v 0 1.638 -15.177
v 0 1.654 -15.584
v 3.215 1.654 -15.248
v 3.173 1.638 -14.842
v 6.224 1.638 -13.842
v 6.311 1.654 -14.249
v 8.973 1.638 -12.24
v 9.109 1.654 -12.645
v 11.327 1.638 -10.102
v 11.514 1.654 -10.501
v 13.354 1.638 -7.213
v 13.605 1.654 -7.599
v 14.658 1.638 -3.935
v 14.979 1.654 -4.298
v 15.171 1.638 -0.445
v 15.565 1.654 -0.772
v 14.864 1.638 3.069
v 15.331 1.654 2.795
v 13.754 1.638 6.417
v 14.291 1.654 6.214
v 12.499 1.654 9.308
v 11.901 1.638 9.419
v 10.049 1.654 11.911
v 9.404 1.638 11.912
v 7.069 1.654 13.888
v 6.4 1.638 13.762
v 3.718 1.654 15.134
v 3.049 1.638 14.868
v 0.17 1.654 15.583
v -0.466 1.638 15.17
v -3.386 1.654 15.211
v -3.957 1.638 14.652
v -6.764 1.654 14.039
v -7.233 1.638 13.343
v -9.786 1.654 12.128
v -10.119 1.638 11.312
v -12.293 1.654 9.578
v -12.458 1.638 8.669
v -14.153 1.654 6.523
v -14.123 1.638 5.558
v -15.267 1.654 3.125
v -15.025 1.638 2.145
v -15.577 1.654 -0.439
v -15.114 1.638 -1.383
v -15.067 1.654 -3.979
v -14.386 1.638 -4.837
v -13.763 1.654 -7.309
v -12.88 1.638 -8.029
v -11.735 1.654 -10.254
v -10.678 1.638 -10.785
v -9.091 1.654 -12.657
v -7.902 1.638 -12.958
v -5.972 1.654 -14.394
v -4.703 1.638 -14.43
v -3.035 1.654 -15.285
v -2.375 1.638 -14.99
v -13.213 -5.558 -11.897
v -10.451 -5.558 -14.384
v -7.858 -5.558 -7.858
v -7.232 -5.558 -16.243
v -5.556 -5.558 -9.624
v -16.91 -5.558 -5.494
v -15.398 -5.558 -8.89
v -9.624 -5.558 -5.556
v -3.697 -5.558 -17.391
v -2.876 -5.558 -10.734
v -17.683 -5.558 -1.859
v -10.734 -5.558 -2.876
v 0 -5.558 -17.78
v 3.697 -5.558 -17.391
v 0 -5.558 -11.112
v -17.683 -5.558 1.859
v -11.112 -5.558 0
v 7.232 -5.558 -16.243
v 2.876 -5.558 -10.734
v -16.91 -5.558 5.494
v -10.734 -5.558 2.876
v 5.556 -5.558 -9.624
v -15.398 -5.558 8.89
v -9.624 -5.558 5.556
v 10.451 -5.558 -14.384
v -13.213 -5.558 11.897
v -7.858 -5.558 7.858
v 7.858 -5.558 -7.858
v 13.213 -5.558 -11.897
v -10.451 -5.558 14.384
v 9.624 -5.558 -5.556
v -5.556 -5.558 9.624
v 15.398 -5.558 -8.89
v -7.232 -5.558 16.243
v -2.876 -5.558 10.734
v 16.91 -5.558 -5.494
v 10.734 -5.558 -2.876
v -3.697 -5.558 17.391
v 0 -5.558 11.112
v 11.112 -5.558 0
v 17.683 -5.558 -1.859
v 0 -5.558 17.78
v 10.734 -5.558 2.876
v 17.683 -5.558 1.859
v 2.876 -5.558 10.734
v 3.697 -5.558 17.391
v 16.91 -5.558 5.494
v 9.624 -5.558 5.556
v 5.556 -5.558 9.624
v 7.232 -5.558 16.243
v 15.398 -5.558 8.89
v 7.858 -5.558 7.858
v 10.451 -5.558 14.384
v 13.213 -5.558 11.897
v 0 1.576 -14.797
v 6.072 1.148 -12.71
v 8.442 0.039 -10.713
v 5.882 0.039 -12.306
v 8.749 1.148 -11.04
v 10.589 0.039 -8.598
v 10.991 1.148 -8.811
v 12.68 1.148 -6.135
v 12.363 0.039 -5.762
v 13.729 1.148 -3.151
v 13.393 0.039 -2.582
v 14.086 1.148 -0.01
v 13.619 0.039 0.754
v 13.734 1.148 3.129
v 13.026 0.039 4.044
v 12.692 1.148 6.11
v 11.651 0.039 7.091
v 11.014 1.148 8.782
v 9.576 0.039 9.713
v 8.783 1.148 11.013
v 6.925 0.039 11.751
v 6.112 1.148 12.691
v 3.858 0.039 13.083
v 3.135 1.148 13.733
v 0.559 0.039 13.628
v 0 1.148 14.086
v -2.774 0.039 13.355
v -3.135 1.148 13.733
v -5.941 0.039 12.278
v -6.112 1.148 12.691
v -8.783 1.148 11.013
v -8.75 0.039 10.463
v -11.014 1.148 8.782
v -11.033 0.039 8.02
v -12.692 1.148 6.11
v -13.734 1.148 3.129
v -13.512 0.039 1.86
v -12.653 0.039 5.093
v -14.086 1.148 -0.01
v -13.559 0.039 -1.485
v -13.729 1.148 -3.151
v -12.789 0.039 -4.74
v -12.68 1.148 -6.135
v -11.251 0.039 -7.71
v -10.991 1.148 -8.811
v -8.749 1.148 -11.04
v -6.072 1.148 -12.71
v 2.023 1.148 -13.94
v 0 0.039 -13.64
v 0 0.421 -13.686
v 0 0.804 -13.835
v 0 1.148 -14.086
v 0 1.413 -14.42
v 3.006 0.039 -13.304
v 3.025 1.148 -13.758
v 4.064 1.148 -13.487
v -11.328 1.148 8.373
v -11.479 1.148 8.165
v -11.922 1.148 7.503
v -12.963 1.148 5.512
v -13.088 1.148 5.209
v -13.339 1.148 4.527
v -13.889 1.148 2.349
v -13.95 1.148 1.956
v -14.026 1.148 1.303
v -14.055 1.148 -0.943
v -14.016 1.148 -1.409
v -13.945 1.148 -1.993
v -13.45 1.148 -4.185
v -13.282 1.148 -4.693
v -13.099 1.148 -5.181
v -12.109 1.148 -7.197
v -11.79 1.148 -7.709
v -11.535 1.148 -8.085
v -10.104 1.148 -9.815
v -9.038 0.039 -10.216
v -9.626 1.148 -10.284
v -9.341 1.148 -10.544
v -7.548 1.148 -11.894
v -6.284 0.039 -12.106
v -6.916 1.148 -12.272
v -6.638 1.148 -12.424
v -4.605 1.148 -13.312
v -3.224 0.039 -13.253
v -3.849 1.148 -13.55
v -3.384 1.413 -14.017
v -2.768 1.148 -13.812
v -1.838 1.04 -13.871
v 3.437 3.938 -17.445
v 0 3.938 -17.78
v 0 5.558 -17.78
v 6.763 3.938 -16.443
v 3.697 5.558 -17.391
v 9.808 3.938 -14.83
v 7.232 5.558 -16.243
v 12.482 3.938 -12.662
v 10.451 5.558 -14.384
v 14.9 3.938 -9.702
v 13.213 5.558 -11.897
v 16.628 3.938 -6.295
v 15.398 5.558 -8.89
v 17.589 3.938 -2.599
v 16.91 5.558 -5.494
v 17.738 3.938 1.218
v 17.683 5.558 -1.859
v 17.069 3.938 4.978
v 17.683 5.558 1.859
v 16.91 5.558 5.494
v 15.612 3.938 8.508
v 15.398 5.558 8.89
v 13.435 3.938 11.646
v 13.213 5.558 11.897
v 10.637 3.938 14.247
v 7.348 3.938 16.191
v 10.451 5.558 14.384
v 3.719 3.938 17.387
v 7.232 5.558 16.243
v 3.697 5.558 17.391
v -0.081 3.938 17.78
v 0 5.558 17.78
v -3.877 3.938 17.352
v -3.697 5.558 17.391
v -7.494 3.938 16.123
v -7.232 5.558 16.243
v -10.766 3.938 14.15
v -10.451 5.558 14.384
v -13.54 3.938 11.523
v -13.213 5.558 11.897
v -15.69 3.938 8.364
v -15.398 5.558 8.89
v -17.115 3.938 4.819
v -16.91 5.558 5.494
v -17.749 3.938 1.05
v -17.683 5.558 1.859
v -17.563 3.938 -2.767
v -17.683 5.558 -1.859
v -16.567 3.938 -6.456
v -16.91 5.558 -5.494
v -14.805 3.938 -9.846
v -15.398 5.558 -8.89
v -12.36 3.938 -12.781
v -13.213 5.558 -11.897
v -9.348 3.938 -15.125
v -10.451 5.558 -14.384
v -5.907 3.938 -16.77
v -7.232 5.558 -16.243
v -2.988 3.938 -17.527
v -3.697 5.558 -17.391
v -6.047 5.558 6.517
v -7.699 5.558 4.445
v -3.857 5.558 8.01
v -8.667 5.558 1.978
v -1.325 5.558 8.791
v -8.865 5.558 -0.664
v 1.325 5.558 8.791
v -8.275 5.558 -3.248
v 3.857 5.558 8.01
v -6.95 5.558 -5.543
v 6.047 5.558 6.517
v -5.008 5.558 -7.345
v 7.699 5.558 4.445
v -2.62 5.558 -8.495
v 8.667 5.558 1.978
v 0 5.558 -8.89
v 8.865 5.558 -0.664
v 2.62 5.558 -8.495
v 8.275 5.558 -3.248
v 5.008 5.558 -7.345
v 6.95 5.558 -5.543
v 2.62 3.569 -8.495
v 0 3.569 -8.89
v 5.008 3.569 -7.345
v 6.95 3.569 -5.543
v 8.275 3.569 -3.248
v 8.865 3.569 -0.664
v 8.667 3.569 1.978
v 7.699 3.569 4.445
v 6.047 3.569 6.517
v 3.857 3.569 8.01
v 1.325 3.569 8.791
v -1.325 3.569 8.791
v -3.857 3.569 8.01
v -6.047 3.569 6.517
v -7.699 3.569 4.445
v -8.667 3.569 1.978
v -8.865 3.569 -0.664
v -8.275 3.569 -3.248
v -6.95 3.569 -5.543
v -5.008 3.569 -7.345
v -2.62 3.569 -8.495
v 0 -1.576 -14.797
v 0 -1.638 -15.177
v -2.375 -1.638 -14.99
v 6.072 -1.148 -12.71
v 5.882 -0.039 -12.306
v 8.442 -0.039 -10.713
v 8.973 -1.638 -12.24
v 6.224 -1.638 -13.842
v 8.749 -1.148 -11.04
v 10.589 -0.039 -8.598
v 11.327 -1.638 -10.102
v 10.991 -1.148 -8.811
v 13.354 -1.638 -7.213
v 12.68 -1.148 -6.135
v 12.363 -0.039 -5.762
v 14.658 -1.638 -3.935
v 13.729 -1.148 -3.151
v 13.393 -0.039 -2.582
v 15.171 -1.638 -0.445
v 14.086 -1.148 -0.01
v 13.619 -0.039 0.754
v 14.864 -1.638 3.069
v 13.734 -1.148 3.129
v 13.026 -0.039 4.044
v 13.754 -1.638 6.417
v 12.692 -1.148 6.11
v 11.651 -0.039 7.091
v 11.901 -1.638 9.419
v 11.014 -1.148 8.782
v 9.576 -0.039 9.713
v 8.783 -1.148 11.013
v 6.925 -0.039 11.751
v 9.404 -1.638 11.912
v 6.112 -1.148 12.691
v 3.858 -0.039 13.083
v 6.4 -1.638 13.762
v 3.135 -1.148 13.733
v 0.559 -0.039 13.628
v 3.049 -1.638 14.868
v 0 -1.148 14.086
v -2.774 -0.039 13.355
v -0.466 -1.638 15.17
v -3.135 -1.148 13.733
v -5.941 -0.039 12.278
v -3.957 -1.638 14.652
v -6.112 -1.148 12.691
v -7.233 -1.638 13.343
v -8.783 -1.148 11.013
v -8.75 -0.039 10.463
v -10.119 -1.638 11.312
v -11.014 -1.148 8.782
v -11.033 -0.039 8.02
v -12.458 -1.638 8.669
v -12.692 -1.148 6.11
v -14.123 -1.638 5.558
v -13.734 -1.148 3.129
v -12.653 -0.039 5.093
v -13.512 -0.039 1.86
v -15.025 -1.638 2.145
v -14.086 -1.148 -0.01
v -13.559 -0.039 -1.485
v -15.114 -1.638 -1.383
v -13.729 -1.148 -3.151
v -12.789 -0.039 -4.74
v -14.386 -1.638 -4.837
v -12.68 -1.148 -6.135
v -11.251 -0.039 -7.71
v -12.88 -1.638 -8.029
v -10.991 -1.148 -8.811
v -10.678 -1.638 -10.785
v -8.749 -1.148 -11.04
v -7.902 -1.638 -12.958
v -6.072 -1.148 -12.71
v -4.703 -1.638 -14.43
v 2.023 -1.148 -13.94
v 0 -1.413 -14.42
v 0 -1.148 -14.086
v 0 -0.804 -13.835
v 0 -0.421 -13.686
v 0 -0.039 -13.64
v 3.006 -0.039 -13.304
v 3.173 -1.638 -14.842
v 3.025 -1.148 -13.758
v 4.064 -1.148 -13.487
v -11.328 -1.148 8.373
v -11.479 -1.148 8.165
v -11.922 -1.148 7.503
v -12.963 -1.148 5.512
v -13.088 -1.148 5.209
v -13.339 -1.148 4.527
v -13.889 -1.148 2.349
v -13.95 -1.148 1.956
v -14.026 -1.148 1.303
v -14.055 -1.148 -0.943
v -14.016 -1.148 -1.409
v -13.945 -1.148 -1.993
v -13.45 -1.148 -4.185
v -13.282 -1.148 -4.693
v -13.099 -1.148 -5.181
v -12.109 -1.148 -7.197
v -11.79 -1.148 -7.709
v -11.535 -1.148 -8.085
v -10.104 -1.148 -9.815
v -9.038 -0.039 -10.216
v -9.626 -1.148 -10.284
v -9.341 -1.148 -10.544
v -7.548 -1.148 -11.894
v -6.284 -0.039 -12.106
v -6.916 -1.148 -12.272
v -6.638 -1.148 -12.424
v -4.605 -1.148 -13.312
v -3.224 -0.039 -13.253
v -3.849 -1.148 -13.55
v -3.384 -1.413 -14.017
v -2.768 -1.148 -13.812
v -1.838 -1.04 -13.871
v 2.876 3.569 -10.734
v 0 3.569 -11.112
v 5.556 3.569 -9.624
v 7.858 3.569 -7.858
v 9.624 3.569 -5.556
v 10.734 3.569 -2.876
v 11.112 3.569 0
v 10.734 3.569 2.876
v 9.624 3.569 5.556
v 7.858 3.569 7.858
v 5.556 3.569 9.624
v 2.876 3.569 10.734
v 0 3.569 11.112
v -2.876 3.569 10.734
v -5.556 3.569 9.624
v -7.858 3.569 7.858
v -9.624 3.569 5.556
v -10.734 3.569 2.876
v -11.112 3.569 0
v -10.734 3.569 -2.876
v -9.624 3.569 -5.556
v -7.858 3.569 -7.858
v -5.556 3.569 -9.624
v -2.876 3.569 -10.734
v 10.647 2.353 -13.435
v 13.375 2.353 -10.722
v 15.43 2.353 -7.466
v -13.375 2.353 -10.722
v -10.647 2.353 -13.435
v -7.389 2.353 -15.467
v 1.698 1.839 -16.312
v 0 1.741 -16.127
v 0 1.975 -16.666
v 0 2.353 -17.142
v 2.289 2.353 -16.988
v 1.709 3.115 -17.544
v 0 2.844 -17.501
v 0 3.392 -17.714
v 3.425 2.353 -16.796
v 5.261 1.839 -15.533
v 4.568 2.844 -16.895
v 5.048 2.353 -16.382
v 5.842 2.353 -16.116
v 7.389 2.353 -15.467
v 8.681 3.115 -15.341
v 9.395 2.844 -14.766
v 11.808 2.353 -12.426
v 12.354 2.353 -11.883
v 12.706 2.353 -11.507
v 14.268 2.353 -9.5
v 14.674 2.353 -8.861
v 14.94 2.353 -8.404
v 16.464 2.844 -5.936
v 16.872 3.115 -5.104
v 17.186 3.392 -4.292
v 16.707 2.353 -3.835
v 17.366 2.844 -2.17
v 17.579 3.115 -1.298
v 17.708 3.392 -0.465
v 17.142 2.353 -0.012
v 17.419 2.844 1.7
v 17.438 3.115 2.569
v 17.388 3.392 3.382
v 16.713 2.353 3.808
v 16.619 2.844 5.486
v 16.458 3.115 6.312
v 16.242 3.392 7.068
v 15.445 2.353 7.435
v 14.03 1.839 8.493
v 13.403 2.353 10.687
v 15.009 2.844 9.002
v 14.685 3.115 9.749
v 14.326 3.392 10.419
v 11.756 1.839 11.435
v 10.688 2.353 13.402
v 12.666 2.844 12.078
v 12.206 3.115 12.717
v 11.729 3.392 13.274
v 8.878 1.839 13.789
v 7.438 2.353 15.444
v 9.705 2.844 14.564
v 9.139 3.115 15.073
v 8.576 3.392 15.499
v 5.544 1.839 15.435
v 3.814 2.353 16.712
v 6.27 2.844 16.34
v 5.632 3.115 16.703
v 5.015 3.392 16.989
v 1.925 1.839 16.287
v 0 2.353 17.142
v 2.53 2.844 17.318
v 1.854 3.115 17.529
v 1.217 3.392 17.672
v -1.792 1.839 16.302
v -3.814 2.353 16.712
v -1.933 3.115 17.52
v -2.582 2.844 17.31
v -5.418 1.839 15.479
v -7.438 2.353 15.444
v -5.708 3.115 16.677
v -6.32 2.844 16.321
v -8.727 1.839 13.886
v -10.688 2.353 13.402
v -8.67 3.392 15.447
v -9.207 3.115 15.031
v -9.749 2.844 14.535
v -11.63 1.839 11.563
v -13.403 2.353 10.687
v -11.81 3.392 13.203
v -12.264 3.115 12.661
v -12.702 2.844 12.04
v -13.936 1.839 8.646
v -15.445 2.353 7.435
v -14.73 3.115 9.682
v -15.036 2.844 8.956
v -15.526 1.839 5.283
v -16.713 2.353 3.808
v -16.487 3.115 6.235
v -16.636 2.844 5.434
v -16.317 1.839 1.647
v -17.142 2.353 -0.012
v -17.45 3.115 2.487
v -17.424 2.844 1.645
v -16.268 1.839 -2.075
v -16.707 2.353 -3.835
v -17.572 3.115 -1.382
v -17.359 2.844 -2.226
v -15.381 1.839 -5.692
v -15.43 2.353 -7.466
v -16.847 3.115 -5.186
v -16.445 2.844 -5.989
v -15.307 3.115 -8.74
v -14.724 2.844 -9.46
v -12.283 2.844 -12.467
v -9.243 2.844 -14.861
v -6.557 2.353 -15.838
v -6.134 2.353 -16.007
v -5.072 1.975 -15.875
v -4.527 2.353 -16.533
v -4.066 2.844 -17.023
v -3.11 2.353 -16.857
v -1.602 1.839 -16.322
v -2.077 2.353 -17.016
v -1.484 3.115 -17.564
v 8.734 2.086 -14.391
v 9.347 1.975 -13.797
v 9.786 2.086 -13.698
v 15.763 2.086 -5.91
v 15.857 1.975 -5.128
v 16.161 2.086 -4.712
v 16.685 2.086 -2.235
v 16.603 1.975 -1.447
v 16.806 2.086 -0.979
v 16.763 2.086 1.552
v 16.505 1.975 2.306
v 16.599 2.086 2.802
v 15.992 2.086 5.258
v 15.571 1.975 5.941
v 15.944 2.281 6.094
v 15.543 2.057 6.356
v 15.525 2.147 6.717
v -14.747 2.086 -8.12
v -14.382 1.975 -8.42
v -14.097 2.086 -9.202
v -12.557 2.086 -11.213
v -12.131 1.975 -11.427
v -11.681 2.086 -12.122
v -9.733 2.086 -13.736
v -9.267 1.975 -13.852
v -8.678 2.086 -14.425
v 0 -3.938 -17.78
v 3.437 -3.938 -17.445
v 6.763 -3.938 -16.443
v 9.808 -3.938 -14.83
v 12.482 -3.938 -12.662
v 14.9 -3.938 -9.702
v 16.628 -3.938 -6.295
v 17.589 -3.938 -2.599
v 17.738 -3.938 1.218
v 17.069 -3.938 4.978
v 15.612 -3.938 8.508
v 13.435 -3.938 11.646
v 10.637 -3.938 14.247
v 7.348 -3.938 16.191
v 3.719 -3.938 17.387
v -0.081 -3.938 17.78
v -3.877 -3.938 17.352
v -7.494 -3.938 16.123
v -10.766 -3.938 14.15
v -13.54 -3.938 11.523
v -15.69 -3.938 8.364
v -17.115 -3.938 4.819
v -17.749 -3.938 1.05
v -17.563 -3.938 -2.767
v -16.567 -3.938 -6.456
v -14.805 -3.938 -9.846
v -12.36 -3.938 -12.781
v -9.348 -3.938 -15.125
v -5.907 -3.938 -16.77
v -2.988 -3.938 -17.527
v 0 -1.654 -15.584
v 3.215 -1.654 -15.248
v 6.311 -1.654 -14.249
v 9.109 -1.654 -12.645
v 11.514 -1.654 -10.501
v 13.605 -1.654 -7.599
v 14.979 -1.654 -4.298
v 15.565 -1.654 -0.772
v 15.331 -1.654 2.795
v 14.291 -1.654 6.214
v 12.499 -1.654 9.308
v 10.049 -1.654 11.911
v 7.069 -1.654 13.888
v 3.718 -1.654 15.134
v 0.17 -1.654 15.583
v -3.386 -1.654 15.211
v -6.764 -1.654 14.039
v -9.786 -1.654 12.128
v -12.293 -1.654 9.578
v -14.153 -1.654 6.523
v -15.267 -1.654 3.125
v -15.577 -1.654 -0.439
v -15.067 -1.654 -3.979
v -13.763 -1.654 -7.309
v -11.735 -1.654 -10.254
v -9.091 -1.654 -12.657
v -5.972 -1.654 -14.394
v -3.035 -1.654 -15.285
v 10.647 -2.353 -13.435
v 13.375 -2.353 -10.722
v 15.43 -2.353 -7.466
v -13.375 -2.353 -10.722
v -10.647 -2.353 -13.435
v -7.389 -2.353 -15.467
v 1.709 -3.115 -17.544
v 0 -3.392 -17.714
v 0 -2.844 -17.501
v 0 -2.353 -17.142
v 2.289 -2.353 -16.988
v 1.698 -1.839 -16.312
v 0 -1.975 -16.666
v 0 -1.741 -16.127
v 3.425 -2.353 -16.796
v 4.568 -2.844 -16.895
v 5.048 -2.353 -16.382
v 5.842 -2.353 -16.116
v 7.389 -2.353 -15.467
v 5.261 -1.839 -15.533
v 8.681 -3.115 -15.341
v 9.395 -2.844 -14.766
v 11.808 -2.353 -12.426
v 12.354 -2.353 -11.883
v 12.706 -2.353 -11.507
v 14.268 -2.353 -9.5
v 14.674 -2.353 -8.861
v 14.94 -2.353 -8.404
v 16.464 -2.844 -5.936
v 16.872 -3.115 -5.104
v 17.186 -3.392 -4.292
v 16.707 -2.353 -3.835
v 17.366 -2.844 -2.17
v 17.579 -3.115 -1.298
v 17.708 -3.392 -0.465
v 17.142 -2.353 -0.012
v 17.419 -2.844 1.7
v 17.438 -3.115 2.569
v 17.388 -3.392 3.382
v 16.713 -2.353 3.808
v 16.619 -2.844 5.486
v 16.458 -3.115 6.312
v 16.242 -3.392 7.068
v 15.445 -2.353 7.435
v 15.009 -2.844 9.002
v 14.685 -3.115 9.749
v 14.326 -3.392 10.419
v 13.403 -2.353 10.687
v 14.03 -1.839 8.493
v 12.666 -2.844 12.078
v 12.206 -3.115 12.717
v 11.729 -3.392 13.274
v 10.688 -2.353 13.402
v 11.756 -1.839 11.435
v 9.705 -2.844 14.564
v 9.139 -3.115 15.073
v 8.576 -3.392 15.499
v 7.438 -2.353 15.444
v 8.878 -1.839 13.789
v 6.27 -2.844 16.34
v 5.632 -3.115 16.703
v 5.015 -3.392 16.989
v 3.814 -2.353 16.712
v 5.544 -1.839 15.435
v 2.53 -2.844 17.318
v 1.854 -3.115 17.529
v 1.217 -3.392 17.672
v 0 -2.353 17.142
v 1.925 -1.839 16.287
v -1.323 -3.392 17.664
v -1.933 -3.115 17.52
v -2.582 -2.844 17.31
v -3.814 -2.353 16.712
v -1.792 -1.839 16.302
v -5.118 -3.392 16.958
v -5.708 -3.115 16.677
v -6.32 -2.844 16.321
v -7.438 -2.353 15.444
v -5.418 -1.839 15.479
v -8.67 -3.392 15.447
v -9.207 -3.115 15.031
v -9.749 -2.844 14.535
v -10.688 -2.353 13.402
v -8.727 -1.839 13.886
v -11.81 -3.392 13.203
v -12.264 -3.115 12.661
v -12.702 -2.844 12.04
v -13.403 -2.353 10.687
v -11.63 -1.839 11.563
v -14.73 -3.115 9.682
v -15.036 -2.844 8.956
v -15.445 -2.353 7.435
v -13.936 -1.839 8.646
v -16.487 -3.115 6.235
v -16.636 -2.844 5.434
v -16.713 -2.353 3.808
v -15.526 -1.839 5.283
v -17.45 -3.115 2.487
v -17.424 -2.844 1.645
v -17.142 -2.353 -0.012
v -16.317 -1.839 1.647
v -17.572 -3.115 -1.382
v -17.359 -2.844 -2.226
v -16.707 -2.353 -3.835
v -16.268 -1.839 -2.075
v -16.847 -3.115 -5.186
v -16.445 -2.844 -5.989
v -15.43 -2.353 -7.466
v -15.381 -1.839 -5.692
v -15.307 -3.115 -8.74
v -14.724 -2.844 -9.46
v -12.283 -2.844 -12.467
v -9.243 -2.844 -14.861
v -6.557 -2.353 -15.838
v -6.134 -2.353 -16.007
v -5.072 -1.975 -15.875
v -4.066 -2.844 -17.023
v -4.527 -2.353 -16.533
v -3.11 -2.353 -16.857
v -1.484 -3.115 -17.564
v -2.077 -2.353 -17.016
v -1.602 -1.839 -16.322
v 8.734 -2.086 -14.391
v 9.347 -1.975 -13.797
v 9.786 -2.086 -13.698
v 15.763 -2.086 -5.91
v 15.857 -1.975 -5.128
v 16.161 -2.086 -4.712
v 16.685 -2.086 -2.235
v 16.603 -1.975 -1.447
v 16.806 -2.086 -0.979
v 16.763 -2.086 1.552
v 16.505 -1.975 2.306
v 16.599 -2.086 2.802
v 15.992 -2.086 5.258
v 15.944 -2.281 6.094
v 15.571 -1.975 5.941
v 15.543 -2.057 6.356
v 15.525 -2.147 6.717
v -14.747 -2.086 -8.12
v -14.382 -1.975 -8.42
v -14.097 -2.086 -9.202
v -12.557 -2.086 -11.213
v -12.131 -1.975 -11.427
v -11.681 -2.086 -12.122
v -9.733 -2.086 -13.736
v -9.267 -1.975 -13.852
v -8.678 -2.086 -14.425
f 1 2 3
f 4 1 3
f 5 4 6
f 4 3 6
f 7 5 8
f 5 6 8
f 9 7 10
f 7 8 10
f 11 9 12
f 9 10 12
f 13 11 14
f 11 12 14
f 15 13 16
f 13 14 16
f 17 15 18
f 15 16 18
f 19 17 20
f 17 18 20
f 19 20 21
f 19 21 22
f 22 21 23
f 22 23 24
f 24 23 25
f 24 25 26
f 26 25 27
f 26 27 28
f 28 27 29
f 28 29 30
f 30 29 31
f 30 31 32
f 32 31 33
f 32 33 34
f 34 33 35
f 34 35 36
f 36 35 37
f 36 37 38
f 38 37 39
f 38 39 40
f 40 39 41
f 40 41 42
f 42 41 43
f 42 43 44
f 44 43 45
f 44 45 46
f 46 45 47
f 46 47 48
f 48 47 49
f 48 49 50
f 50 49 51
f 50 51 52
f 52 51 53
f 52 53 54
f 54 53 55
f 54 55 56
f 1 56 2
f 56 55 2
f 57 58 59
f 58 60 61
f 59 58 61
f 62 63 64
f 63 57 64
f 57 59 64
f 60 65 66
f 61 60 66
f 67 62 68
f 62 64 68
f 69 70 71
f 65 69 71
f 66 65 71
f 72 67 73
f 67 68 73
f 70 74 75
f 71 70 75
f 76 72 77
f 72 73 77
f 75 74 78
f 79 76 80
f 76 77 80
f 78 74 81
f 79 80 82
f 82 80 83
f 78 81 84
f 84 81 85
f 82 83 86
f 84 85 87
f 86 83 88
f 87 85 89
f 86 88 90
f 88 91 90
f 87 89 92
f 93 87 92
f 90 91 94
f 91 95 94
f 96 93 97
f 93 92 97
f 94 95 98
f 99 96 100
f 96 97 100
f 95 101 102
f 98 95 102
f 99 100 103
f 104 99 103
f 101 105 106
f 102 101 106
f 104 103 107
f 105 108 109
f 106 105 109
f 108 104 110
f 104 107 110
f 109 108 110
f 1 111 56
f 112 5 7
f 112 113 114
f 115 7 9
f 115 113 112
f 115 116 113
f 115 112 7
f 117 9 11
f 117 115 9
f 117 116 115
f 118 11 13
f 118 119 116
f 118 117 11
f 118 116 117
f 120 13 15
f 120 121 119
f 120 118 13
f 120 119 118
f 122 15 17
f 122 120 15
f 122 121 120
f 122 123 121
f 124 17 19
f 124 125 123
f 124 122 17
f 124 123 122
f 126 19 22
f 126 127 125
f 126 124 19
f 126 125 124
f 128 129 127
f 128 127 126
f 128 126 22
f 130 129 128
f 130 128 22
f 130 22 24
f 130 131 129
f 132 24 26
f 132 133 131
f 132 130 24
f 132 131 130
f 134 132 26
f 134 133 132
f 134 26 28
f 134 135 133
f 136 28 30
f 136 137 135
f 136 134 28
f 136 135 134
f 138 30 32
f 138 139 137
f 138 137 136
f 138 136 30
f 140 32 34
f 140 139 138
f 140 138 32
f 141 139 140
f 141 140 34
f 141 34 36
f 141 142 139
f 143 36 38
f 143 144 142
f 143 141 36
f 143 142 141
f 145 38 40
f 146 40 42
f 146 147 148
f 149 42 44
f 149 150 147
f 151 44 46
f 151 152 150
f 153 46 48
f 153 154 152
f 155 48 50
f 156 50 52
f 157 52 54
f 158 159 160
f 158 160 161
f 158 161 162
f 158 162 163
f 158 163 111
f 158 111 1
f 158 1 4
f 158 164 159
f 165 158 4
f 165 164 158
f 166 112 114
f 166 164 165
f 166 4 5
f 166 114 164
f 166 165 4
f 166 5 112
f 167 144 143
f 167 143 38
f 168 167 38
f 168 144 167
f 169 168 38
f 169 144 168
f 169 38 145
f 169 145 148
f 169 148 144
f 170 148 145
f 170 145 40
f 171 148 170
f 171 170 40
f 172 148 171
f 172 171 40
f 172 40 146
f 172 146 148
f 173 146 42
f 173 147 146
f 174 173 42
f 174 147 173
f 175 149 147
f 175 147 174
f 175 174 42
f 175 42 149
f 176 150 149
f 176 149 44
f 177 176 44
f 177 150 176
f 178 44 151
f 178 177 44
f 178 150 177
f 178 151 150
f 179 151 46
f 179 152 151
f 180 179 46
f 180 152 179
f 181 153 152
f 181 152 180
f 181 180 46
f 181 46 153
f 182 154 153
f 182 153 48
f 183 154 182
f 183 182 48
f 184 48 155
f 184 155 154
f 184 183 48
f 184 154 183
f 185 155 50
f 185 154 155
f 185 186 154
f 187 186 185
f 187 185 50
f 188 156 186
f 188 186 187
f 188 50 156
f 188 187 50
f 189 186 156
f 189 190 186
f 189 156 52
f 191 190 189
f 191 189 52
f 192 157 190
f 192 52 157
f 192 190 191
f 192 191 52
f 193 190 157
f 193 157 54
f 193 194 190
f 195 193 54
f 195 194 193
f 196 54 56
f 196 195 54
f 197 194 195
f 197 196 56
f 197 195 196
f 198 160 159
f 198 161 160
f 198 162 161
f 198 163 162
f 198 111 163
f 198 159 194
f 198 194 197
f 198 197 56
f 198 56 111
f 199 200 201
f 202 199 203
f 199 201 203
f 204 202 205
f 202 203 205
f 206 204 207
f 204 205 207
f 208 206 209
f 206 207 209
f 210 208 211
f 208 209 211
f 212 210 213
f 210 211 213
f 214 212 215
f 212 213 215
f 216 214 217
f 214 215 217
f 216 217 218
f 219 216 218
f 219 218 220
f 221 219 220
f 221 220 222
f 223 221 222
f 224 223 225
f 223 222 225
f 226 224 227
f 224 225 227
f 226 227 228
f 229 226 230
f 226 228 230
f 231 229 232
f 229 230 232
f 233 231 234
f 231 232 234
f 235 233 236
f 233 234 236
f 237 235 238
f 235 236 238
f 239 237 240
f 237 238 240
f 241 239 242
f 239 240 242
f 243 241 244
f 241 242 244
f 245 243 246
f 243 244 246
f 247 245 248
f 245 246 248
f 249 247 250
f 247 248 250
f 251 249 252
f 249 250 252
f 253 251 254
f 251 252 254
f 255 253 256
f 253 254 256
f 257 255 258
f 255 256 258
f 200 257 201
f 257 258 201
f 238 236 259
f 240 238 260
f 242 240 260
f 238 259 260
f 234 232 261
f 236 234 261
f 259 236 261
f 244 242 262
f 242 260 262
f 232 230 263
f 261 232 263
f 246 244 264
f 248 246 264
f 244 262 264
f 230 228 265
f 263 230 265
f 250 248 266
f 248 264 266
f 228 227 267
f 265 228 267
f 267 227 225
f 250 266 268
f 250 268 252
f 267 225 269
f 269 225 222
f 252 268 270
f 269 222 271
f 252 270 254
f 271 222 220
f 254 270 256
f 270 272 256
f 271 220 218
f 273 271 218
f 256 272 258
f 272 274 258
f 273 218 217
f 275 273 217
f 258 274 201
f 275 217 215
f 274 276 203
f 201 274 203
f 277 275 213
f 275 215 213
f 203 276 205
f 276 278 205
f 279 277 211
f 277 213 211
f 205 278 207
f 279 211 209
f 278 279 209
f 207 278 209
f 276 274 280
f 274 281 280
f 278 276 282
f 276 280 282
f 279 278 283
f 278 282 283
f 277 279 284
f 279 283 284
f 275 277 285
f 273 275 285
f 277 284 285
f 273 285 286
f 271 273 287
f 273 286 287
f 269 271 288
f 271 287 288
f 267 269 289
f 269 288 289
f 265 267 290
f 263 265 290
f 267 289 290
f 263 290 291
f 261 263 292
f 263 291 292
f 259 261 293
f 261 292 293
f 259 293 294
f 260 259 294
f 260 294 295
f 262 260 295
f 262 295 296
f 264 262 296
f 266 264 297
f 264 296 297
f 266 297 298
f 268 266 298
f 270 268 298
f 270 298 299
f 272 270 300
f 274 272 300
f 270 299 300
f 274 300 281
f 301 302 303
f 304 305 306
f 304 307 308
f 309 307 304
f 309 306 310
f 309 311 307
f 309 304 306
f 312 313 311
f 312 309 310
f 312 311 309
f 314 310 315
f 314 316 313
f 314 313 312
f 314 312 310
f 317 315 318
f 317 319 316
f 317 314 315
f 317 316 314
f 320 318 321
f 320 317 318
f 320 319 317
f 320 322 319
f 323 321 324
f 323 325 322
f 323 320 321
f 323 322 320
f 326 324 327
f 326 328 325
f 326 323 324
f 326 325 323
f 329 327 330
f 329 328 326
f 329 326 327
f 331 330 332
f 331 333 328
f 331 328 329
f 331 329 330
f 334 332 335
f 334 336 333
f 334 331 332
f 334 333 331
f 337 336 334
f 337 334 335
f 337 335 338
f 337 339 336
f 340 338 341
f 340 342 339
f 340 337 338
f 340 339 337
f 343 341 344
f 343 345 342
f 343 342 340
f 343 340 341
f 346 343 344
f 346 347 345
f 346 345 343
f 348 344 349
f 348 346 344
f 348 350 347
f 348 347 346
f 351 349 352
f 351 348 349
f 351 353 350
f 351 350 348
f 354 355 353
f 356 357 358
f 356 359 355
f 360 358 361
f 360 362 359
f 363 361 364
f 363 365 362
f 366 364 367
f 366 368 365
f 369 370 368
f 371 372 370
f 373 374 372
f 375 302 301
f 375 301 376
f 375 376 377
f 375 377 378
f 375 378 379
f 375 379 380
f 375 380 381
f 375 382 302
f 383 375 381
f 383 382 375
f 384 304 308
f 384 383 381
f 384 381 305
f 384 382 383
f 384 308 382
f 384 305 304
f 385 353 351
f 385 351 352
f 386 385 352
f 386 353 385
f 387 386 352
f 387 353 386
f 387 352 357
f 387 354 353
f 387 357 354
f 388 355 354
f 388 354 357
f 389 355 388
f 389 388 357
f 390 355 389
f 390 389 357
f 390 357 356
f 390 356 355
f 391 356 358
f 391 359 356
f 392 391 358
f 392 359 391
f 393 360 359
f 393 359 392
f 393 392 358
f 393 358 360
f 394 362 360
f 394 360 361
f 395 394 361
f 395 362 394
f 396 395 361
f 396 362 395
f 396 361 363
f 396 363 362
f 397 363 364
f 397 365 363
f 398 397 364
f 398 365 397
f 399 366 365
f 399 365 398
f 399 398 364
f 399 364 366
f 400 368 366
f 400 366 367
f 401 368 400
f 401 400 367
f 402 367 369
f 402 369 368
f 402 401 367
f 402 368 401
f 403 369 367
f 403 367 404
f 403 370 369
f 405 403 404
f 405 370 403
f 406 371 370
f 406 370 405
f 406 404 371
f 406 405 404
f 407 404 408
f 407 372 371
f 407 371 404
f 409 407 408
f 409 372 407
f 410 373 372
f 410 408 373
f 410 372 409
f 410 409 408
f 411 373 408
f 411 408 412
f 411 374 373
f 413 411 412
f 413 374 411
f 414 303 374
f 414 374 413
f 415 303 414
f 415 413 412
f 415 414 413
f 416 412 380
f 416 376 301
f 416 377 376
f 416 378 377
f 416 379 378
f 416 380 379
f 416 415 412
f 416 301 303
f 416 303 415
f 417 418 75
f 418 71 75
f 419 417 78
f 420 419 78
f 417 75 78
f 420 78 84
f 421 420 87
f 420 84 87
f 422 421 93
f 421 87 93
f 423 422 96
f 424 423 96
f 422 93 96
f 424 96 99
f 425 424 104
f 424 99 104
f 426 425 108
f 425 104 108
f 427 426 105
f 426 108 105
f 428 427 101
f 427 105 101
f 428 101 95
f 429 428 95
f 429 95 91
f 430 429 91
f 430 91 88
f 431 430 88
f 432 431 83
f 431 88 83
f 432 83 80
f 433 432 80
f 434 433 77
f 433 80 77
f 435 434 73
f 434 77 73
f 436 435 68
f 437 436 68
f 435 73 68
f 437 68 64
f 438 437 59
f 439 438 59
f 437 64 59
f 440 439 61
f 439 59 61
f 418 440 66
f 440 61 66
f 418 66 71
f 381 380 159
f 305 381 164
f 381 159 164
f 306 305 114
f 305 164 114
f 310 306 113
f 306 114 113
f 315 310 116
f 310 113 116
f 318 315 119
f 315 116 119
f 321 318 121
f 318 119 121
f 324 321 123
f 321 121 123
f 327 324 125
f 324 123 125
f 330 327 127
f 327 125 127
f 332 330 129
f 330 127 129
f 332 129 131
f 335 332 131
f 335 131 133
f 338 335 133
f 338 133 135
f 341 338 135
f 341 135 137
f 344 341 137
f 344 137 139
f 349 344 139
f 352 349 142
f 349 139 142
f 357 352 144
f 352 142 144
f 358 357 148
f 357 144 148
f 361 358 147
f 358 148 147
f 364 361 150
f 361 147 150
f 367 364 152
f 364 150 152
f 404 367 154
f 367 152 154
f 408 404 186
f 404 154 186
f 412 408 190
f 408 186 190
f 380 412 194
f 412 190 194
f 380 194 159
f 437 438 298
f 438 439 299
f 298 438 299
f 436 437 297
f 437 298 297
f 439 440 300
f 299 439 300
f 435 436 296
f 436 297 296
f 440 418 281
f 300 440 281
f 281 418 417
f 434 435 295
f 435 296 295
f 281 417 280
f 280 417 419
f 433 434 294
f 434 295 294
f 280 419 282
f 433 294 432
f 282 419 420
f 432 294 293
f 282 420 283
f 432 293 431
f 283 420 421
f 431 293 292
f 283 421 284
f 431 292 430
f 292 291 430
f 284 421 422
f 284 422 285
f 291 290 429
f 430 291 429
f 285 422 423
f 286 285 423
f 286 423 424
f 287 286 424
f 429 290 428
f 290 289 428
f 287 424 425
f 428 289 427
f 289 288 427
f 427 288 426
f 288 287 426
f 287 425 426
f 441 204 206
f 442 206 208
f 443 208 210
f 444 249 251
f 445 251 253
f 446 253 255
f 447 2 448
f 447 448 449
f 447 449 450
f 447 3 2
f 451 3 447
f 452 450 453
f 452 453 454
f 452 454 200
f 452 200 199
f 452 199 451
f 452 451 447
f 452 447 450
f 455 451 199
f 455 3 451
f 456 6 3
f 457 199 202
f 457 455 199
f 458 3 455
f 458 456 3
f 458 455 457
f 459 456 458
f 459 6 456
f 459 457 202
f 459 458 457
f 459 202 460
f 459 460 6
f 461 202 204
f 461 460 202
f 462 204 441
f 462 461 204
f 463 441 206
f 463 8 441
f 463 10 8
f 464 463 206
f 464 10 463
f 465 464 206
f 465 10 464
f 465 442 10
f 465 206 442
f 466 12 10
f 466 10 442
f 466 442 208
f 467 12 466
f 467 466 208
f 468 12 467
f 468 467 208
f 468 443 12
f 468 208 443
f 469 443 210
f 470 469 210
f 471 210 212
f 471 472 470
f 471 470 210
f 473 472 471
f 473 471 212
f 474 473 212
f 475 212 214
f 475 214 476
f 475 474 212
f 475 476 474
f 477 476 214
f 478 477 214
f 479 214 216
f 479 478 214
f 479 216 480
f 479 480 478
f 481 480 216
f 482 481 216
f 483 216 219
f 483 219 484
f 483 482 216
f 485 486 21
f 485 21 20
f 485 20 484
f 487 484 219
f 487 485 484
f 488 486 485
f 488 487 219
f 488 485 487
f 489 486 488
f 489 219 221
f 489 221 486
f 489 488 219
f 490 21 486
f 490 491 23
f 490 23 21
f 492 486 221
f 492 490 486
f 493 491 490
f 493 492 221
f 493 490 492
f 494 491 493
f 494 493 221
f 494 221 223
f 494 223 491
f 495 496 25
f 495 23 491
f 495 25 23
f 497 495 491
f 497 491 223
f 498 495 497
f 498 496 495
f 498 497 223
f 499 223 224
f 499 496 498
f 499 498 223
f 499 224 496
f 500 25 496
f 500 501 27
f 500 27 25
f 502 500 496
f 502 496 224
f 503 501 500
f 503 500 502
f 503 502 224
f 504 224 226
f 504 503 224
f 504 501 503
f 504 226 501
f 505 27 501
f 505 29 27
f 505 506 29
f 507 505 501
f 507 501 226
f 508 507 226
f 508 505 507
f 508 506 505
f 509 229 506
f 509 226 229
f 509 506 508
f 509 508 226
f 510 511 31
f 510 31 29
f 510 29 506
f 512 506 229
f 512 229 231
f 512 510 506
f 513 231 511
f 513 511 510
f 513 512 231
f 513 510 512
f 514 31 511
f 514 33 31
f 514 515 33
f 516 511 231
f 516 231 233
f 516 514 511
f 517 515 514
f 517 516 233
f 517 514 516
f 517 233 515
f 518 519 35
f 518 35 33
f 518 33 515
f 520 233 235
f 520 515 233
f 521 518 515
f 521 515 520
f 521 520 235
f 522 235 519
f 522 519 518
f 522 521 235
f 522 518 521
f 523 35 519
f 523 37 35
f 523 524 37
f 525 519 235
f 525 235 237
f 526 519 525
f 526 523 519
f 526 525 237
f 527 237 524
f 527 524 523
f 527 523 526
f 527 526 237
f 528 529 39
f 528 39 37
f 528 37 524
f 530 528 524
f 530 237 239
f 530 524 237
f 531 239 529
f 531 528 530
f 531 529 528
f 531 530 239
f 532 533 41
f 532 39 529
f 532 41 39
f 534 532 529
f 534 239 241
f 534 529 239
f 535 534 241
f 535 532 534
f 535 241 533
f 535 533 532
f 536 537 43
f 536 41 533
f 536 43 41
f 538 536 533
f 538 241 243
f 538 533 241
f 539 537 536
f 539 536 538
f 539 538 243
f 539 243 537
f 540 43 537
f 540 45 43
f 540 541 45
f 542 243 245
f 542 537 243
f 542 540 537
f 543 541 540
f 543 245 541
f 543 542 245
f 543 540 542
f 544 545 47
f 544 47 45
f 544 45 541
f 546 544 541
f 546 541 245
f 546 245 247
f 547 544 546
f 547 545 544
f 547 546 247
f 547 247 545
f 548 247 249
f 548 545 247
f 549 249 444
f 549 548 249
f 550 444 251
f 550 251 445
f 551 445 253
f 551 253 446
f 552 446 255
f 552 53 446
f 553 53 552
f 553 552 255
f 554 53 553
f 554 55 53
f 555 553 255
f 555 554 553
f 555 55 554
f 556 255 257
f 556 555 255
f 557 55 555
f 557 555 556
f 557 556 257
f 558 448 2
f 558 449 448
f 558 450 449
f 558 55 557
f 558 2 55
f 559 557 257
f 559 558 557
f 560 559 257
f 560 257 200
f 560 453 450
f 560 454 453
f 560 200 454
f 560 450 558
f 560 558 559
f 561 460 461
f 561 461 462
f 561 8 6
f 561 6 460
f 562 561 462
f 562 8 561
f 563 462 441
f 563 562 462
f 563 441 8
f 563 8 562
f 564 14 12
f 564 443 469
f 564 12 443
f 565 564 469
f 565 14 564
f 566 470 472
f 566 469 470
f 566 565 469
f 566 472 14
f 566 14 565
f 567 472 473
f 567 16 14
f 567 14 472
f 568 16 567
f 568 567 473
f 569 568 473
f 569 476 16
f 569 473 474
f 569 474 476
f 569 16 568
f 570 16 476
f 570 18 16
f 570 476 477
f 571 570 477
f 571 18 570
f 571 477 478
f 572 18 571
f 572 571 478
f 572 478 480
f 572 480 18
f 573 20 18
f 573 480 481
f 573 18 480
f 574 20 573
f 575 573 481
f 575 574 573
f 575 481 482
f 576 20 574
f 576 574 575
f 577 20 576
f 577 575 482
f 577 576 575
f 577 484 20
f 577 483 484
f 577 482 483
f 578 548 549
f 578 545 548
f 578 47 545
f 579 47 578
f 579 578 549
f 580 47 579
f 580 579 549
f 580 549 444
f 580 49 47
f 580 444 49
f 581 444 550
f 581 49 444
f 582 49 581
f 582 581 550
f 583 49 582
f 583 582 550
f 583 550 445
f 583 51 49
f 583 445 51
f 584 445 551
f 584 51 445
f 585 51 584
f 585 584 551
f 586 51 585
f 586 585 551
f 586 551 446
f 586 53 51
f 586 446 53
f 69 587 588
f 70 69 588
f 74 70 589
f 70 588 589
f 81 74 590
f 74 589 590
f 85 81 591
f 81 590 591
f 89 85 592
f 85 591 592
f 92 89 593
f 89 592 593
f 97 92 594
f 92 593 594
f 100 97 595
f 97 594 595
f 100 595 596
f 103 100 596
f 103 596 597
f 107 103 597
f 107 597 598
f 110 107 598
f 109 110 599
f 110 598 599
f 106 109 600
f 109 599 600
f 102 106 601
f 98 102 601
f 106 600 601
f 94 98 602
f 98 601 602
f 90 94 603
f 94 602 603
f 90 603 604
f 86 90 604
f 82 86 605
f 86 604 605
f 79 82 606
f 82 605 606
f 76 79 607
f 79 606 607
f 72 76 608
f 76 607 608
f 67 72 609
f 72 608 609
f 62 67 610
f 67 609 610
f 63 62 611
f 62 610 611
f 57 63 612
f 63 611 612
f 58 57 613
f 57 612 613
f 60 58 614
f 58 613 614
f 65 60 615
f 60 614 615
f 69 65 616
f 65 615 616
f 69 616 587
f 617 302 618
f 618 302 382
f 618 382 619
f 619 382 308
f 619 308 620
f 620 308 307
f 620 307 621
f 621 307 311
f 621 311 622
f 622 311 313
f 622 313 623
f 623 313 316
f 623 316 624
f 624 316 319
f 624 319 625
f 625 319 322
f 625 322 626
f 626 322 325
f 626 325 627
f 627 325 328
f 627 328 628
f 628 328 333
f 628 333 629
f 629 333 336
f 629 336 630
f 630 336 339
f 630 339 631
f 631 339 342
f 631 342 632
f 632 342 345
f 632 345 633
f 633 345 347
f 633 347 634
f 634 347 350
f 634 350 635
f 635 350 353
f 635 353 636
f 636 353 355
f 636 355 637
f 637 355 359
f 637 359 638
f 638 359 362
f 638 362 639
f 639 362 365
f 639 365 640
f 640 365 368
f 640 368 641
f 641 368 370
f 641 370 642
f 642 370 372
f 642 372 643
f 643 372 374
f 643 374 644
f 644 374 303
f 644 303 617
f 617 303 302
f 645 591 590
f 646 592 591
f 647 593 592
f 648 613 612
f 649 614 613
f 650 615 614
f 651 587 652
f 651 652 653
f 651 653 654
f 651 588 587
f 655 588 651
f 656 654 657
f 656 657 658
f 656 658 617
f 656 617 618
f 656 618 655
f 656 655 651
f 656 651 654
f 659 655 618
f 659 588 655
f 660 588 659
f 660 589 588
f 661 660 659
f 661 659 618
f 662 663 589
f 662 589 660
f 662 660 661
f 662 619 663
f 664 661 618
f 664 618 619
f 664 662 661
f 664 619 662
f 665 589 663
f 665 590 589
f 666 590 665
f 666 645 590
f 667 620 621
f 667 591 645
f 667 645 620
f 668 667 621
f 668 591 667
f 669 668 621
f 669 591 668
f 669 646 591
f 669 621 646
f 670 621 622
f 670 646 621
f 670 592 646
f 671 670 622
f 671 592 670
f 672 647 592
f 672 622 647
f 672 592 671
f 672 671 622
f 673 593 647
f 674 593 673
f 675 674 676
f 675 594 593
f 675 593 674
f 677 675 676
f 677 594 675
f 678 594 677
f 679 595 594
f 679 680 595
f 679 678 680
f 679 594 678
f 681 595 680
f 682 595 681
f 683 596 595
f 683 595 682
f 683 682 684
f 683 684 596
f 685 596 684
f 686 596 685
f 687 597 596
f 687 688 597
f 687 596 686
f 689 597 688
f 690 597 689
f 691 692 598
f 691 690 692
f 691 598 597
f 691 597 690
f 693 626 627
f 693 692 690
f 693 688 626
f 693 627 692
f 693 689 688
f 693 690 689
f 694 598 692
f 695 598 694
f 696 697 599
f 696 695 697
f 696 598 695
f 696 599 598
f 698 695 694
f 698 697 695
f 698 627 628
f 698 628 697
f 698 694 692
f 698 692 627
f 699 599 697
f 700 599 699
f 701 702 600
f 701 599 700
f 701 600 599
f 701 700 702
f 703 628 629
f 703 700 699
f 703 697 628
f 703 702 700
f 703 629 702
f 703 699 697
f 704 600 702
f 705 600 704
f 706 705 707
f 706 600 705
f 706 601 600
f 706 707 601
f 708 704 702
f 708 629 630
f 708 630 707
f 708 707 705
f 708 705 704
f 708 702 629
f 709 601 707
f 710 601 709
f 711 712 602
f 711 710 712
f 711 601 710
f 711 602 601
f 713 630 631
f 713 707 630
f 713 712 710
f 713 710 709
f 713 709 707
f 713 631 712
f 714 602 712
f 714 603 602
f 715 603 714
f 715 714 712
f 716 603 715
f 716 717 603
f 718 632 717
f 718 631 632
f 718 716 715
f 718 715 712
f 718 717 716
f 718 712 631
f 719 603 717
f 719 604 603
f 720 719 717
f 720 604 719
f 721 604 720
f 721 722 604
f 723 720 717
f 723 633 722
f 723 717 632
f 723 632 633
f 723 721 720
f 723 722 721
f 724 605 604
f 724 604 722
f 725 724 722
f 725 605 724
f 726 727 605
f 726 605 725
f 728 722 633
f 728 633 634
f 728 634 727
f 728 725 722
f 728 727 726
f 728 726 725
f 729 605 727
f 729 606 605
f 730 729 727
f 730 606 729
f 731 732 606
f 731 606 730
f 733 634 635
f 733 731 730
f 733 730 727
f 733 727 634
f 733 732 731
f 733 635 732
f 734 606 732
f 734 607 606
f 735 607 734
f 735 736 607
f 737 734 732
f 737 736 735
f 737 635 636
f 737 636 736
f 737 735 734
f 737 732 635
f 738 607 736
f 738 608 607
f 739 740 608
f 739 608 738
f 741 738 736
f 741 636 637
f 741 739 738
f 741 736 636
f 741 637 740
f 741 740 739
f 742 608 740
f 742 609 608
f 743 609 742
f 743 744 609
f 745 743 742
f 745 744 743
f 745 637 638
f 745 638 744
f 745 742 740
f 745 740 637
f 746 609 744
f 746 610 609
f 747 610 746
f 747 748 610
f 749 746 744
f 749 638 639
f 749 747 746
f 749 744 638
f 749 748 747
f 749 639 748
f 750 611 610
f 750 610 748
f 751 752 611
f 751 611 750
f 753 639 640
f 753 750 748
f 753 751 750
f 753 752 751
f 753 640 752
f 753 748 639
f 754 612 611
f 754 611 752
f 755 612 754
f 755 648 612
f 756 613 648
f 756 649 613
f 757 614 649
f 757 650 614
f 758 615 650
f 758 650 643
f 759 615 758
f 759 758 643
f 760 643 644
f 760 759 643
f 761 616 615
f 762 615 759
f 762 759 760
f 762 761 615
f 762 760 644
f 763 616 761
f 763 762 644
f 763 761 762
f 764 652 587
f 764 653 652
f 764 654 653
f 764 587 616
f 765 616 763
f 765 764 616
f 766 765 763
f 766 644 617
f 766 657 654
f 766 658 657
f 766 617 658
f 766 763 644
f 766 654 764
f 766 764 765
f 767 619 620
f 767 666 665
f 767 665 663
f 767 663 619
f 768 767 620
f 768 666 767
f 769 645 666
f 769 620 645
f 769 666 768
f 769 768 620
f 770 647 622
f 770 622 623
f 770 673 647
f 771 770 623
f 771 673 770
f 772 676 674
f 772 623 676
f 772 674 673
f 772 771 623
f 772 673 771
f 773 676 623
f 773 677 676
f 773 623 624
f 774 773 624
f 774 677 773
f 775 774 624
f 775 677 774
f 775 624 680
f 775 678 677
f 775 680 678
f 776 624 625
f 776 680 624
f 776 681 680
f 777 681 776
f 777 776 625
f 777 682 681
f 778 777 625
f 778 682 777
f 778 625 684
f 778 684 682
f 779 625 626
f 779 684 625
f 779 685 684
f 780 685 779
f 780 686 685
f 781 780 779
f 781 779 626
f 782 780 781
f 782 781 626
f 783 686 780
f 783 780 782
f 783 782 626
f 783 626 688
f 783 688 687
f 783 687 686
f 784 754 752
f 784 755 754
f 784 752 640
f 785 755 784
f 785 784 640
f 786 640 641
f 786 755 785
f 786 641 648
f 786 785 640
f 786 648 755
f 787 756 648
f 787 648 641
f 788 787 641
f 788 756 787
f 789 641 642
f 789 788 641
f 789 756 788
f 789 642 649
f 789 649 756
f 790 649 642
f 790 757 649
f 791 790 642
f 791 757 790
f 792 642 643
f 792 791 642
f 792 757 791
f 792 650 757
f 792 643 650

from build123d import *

# Parameters (mm, degrees)
FILLET5_R = 2.286
FILLET6_R = 1.6002


with BuildPart() as part:
    # Sketch2 → Revolve1 (revolve)
    with BuildSketch(Plane(origin=(0, 0, 0), x_dir=(0, 0, -1), z_dir=(1, 0, 0))):
        Polygon((8.89, 5.55752), (8.89, 3.5687), (11.1125, 3.5687), (11.1125, -5.55752), (17.78, -5.55752), (17.78, -1.7399), (13.639699492, -1.57734), (13.639699492, 1.57734), (17.78, 1.7399), (17.78, 5.55752), align=None)
    revolve(axis=Axis((0, 16.043148, 0), (0, -1, 0)))

    # Fillet5
    fillet5_edges = [part.edges().sort_by_distance(p)[0] for p in [
        (0, 1.7399, 17.78),
        (0, -1.7399, 17.78),
    ]]
    fillet(fillet5_edges, radius=FILLET5_R)

    # Fillet6
    fillet6_edges = [part.edges().sort_by_distance(p)[0] for p in [
        (0, 1.57734, 13.639699492),
        (0, -1.57734, 13.639699492),
    ]]
    fillet(fillet6_edges, radius=FILLET6_R)


solid = part.part
